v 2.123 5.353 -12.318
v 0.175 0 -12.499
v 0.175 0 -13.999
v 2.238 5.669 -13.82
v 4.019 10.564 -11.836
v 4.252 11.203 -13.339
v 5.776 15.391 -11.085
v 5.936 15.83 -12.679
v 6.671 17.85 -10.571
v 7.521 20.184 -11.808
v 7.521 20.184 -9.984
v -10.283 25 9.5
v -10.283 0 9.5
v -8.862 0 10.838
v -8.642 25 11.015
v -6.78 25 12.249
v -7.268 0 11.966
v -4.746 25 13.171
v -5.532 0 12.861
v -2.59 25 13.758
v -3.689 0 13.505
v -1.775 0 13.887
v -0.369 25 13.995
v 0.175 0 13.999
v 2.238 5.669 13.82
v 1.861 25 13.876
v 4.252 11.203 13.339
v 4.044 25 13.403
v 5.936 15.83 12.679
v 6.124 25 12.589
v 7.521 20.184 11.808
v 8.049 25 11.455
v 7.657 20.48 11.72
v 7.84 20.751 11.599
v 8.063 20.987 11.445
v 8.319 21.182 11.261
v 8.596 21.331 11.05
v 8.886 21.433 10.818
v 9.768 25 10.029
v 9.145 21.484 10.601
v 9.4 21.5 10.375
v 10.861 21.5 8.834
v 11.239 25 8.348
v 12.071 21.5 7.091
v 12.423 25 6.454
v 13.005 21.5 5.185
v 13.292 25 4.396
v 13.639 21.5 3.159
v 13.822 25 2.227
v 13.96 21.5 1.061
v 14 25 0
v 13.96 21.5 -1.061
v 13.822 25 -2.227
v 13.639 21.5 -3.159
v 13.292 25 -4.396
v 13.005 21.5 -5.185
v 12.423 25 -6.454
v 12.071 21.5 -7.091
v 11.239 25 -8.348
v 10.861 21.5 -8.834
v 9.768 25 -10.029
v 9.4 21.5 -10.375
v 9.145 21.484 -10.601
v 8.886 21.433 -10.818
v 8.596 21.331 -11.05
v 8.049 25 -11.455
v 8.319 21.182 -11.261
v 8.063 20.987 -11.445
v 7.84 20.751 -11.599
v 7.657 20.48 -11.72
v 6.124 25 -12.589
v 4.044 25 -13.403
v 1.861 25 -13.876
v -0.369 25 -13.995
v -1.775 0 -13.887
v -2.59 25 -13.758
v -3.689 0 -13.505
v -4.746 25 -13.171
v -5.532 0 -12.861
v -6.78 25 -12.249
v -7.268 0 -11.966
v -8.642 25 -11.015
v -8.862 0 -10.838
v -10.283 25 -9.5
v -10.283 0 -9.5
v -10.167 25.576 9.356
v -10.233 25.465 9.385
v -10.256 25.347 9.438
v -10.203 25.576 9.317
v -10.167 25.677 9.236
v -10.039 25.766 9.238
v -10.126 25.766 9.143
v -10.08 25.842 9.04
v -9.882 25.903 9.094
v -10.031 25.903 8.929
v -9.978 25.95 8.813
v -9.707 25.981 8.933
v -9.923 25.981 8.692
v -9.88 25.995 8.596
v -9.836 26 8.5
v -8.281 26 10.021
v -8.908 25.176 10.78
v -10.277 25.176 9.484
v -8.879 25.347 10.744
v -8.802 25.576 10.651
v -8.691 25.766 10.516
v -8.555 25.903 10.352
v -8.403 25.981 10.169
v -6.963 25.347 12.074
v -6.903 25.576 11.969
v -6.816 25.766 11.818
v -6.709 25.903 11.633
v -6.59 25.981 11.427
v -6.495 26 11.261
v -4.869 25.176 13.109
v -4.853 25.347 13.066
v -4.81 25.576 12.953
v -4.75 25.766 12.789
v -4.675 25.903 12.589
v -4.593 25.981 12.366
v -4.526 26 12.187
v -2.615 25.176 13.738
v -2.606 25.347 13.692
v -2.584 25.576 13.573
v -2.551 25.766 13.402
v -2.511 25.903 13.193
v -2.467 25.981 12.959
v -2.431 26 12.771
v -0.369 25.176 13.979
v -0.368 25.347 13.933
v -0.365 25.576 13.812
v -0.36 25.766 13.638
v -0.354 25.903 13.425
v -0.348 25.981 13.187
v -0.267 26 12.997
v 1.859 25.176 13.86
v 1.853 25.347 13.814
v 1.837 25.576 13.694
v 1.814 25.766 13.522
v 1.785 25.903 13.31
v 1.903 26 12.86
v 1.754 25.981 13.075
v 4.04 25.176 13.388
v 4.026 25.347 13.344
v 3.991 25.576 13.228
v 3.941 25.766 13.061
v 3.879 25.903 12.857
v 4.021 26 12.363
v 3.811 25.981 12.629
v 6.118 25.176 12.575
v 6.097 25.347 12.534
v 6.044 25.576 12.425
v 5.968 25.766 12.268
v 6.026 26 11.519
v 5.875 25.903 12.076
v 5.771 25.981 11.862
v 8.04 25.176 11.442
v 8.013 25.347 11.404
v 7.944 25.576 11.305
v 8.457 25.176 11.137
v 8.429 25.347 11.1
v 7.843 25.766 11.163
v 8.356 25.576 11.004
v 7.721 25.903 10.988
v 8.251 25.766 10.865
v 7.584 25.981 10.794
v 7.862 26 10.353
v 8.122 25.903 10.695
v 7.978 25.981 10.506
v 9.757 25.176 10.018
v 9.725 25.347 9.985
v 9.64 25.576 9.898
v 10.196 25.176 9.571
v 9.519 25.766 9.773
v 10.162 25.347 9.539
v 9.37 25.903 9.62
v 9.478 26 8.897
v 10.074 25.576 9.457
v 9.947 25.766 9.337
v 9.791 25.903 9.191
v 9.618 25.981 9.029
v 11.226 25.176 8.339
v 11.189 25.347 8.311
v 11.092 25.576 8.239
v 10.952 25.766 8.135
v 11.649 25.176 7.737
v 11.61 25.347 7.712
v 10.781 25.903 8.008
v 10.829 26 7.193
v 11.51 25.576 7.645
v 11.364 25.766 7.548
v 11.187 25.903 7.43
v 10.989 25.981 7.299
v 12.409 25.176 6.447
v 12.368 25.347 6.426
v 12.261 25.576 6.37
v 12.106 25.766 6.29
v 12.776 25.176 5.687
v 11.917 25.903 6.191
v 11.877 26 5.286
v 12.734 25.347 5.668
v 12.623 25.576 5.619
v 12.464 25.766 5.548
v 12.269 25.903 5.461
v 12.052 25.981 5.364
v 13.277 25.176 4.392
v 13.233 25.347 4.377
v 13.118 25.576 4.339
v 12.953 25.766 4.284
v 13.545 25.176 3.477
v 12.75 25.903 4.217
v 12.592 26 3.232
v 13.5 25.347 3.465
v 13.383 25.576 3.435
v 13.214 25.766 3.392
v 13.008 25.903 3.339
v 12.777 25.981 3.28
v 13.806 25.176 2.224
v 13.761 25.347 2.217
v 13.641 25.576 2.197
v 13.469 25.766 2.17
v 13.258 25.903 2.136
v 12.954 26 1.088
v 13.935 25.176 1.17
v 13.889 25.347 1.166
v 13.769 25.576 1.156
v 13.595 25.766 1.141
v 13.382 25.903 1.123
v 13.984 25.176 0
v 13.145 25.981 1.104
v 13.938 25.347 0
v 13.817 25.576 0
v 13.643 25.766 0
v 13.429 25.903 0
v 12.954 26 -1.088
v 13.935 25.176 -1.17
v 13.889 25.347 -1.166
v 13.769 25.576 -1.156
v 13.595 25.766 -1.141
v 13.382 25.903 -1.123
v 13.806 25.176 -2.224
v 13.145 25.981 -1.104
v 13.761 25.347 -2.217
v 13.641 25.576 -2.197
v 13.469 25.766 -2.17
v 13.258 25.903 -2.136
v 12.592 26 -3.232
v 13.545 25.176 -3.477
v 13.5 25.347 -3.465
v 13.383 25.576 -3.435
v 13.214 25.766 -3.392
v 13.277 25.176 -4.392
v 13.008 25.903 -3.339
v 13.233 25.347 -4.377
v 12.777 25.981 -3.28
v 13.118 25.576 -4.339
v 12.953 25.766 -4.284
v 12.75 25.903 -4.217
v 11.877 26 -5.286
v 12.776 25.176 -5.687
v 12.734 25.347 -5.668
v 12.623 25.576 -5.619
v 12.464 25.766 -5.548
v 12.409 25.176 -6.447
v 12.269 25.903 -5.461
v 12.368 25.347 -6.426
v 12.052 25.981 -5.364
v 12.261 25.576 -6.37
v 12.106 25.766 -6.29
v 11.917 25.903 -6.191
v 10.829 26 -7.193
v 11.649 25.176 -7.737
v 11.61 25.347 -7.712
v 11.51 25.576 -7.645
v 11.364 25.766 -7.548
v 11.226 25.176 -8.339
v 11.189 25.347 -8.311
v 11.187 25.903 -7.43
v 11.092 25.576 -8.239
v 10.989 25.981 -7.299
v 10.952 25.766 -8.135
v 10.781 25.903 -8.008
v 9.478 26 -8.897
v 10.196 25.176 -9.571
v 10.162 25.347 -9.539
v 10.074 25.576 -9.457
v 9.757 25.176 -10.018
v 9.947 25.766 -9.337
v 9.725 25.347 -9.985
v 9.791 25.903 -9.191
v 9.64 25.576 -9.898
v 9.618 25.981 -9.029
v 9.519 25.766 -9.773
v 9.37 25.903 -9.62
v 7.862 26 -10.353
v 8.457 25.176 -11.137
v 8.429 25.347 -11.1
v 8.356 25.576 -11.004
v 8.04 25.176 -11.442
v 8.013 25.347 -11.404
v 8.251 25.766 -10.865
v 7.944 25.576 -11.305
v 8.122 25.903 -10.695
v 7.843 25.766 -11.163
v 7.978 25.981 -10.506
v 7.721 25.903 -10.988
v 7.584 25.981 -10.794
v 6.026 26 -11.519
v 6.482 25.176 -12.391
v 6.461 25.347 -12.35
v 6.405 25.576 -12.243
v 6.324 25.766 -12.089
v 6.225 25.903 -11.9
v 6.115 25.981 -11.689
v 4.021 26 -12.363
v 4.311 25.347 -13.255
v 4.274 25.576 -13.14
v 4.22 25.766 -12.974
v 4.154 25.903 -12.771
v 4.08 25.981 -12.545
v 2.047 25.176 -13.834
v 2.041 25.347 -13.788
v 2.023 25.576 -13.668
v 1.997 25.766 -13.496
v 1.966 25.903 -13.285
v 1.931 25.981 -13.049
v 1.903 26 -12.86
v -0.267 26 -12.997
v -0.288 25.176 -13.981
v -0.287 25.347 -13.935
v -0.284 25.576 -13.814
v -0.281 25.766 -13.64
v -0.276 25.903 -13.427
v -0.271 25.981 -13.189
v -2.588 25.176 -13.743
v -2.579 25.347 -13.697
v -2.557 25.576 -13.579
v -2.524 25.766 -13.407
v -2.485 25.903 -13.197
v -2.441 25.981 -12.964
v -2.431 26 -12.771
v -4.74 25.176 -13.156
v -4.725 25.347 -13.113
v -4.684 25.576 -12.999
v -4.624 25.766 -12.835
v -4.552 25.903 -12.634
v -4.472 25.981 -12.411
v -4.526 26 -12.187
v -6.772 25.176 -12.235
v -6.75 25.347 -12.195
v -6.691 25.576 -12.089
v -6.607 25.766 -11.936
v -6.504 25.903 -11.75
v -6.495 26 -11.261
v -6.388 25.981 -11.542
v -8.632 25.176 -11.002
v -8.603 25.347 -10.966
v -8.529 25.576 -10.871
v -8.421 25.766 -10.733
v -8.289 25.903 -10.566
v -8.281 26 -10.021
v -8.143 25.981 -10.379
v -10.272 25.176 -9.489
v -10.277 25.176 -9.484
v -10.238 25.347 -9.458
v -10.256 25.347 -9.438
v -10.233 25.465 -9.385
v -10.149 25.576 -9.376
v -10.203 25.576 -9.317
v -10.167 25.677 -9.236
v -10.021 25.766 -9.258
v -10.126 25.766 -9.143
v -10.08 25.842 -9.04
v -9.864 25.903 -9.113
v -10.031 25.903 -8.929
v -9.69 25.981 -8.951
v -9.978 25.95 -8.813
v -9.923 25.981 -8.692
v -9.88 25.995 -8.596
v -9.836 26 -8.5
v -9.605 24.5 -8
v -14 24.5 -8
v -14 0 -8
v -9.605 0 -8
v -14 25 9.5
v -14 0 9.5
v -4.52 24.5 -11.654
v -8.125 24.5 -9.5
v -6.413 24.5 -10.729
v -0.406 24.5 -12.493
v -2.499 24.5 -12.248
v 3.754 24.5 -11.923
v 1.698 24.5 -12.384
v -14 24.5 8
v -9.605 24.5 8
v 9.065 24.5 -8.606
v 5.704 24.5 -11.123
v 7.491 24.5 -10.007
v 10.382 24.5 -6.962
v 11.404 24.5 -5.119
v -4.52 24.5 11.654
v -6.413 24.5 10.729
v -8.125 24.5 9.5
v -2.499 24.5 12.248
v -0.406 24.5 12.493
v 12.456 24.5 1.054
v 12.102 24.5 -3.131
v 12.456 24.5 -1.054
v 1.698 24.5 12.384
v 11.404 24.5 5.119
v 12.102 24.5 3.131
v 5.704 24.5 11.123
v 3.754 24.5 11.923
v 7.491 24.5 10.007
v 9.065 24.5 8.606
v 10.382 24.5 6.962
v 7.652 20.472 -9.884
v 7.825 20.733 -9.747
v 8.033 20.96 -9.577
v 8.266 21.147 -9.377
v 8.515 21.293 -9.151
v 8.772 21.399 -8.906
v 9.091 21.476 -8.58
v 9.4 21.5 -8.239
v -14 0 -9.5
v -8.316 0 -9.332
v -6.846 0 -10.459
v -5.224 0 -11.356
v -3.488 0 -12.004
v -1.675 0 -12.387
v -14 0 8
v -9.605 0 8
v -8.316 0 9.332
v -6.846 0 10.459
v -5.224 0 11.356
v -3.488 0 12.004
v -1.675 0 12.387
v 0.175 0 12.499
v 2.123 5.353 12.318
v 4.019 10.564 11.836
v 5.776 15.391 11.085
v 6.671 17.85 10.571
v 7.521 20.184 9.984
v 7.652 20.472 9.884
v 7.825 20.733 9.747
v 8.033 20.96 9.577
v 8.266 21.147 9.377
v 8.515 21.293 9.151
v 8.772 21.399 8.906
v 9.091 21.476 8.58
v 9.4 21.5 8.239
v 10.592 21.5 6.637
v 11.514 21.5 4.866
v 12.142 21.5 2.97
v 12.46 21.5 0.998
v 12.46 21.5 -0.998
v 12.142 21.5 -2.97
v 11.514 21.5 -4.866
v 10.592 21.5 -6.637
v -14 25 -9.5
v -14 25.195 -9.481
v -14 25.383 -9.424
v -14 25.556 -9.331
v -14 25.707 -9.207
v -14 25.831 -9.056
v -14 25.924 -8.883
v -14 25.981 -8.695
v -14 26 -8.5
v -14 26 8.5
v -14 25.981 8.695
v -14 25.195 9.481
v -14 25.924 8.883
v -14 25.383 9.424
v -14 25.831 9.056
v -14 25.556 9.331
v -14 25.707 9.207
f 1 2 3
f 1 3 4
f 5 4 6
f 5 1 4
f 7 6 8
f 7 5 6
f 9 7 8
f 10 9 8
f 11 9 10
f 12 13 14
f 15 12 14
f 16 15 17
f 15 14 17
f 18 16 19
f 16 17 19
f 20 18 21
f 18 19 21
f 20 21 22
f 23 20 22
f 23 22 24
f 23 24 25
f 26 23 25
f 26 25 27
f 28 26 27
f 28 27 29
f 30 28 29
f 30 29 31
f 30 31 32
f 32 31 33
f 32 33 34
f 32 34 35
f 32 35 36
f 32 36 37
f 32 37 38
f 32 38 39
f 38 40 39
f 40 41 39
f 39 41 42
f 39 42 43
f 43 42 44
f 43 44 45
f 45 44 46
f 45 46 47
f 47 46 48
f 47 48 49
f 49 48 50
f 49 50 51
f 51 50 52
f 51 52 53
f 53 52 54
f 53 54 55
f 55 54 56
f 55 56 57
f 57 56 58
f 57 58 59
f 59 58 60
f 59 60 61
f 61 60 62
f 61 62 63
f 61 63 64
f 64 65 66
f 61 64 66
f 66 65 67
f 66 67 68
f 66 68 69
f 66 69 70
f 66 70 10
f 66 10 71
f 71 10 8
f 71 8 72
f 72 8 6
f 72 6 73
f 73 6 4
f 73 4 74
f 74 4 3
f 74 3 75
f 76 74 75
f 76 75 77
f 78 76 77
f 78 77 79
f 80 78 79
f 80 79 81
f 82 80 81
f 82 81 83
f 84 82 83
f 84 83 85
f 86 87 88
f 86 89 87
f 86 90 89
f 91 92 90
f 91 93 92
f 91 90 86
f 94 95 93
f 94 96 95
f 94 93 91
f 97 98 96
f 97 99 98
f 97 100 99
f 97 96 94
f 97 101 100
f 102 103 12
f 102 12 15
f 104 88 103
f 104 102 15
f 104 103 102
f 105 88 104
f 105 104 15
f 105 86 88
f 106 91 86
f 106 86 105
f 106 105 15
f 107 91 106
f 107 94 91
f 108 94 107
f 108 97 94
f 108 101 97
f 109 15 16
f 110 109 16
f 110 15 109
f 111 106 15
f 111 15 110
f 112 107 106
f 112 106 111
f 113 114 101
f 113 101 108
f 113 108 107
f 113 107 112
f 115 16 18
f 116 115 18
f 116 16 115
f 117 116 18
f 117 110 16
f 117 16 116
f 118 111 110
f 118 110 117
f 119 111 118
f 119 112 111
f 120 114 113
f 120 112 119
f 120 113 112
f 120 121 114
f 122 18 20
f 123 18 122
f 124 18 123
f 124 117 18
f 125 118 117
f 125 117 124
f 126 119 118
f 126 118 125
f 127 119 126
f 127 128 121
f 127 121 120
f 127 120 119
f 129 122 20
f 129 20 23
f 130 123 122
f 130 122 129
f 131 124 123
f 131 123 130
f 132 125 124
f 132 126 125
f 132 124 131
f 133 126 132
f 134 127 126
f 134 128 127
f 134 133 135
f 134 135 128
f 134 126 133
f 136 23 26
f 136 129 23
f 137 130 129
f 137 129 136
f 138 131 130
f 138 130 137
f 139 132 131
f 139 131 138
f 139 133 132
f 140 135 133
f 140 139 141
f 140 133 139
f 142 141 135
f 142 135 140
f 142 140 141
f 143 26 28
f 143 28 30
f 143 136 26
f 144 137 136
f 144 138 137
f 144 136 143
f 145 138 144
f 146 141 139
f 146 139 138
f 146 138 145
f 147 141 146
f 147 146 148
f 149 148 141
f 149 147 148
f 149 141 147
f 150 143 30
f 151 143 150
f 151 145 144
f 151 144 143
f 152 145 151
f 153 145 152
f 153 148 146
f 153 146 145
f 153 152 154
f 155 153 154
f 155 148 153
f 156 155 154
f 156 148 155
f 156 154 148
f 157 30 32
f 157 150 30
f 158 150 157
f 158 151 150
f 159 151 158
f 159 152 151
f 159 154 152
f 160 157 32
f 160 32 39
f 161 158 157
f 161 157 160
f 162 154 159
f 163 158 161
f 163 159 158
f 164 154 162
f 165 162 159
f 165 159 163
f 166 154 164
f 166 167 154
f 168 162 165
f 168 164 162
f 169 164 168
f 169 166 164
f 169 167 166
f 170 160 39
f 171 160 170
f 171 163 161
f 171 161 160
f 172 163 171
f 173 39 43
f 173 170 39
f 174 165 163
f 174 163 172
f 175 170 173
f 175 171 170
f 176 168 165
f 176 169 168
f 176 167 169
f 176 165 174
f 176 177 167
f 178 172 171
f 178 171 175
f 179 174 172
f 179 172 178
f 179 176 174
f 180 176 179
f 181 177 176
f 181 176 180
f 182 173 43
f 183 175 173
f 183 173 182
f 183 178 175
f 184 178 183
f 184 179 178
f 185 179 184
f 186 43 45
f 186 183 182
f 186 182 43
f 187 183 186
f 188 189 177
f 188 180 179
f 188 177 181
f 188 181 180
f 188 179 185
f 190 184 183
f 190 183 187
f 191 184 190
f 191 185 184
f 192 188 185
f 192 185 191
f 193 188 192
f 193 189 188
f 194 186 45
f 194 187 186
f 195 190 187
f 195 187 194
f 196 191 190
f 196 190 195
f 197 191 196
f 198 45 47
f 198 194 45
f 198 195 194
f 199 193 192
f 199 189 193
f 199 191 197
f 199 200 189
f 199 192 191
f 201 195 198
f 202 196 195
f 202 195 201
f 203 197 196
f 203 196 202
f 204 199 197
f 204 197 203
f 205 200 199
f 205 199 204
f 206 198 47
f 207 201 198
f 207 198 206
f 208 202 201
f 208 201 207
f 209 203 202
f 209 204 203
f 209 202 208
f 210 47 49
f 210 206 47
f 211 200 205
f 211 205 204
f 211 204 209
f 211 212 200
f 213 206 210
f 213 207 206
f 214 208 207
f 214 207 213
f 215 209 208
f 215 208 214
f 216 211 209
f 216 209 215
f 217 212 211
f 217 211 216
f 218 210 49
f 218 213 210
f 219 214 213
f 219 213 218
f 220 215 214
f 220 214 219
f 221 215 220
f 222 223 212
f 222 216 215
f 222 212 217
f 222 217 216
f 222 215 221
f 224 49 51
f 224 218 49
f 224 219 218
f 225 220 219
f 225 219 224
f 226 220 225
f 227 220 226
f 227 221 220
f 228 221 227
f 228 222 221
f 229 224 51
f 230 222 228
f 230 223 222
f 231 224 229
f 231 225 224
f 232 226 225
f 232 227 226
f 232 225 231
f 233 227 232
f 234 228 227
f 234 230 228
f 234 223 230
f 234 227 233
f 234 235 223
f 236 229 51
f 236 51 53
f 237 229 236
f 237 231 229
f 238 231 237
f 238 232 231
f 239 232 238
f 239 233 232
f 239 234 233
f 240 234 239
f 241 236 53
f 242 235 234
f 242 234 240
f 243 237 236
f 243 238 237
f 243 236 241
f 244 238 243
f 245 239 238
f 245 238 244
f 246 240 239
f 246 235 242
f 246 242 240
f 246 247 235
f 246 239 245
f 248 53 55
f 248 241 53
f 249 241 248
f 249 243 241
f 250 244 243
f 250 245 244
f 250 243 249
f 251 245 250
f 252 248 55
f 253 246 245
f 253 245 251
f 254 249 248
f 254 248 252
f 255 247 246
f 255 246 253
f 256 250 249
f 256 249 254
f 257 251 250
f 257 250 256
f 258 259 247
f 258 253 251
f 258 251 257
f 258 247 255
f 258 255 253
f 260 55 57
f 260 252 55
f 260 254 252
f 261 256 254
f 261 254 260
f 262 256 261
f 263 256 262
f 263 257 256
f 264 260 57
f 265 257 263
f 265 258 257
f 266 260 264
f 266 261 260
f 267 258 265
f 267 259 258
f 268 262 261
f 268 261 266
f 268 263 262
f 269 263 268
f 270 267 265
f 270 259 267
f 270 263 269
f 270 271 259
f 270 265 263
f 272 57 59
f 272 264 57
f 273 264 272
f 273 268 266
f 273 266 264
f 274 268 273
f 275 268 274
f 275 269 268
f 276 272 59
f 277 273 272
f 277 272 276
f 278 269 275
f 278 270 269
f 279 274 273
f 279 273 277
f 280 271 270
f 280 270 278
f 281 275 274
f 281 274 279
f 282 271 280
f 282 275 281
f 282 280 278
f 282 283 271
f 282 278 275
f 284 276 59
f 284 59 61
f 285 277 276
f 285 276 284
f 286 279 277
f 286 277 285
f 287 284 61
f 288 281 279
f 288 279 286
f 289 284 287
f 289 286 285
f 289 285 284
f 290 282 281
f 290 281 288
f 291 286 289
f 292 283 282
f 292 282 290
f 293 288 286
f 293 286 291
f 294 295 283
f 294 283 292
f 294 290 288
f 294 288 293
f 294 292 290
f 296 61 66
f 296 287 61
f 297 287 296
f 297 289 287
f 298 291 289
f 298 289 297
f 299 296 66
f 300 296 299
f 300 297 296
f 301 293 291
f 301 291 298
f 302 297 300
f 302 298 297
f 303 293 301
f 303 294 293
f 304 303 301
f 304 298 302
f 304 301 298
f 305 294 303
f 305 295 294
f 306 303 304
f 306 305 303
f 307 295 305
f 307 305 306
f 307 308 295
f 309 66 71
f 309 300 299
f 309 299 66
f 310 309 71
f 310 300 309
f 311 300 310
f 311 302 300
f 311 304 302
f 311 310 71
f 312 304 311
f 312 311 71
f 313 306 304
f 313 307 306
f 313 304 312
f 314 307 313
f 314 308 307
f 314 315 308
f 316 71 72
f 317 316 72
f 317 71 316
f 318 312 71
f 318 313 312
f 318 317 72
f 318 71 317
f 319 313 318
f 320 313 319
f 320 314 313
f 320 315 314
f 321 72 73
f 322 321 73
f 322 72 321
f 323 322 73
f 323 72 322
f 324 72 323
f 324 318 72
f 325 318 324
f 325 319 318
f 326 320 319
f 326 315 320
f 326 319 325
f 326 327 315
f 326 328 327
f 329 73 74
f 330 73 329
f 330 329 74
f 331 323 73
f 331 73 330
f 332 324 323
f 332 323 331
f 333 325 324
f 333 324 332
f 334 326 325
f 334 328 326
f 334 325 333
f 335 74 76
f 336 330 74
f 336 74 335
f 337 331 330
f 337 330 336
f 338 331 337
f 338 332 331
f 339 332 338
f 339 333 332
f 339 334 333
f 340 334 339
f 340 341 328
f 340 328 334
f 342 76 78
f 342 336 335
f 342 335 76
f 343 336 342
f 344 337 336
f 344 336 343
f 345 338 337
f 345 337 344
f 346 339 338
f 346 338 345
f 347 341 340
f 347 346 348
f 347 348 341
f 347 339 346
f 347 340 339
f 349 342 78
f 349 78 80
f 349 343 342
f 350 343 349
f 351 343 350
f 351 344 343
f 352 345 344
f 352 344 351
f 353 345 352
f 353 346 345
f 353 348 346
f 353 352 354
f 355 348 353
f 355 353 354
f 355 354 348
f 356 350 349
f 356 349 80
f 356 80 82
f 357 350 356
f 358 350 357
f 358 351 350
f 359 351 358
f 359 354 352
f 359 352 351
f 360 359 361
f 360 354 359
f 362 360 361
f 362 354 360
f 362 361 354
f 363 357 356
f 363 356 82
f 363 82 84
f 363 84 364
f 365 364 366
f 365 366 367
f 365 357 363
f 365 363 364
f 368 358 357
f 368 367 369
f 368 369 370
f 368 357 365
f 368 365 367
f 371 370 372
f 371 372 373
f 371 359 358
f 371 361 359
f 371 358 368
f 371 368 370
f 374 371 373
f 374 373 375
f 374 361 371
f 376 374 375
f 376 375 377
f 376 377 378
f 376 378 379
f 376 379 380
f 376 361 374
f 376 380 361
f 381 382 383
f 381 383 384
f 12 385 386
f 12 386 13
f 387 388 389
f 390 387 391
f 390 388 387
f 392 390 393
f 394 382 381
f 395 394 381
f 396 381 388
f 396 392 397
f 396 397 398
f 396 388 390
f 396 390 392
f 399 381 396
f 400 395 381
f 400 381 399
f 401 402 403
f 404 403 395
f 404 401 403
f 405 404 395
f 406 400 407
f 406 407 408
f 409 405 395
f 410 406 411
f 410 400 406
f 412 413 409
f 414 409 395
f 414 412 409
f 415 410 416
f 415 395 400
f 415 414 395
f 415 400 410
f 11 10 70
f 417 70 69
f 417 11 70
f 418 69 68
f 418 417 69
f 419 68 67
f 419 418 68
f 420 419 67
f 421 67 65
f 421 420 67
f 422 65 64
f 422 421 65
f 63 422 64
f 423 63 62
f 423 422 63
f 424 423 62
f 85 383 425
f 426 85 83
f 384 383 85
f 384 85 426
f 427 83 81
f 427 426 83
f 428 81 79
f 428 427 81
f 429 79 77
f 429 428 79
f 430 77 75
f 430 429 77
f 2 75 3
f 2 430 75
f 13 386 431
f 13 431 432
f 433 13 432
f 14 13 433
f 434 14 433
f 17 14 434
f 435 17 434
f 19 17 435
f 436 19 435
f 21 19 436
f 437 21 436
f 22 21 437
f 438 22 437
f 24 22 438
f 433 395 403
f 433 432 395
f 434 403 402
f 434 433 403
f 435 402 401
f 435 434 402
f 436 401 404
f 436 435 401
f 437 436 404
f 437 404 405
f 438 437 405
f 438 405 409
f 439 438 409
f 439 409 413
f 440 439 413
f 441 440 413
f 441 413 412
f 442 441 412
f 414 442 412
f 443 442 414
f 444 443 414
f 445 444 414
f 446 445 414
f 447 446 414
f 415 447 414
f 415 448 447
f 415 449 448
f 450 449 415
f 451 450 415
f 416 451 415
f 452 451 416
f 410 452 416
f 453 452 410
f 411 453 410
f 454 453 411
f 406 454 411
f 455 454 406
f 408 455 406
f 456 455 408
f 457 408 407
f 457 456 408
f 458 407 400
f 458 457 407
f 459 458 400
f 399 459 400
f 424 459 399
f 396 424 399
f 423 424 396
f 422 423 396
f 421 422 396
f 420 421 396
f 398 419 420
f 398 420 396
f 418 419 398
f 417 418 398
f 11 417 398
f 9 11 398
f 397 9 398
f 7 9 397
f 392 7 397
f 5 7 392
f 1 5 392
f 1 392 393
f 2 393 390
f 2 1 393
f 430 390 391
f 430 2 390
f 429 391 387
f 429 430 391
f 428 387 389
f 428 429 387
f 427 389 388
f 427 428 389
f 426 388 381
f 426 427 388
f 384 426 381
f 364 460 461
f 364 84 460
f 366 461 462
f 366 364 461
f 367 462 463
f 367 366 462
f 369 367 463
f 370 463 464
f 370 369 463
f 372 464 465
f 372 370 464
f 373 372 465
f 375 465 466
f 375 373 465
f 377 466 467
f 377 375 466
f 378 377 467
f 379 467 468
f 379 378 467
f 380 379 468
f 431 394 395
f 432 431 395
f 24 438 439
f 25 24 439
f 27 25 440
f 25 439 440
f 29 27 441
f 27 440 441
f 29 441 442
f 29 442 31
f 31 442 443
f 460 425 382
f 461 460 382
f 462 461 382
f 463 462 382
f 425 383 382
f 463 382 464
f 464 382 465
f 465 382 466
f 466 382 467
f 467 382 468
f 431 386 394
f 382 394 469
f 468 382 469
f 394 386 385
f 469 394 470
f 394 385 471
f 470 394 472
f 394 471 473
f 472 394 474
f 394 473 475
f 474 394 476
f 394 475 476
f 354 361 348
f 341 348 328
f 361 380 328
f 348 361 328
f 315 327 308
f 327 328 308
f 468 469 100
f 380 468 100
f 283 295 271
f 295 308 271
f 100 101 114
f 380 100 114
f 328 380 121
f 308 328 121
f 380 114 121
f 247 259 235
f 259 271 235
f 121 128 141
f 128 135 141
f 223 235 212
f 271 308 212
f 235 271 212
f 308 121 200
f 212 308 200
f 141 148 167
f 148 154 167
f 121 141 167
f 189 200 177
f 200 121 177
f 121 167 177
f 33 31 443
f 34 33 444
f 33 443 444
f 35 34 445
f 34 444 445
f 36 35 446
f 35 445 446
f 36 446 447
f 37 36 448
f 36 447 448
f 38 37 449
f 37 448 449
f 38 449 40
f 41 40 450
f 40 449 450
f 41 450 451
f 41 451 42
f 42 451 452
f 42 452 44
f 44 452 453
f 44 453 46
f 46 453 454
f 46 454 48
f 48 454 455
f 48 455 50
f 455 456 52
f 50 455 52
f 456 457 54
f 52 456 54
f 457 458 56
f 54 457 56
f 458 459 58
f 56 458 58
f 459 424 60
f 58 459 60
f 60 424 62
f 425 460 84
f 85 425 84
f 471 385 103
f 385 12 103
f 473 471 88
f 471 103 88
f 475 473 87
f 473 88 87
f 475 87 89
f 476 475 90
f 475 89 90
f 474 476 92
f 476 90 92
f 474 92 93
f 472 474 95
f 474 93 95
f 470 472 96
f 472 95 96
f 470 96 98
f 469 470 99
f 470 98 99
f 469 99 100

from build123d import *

# Parameters (mm, degrees)
SKETCH1_R               = 14
BOSS_EXTRUDE1_DEPTH     = 26
SKETCH3_W               = 14
SKETCH3_H               = 26
BOSS_EXTRUDE2_DEPTH     = 9.5
SHELL1_T                = -1.5
CUT_EXTRUDE1_DEPTH      = 15
CUT_EXTRUDE1_DEPTH_BACK = 15
FILLET1_R               = 1


with BuildPart() as part:
    # Sketch1 → Boss-Extrude1 (new body)
    with BuildSketch(Plane(origin=(0, 0, 0), x_dir=(1, 0, 0), z_dir=(0, 1, 0))):
        Circle(SKETCH1_R)
    extrude(amount=BOSS_EXTRUDE1_DEPTH)

    # Sketch3 → Boss-Extrude2 (add, symmetric)
    with BuildSketch(Plane.XY):
        with Locations((-7, 13)):
            Rectangle(SKETCH3_W, SKETCH3_H)
    extrude(amount=BOSS_EXTRUDE2_DEPTH, both=True)

    # Shell1
    shell1_openings = [part.faces().sort_by_distance(p)[0] for p in [
        (-6.070870475, 0, 0),
        (-14, 13, 0),
    ]]
    offset(amount=SHELL1_T, openings=shell1_openings, kind=Kind.INTERSECTION)

    # Sketch4 → Cut-Extrude1 (cut, two sides)
    with BuildSketch(Plane.XY) as cut_extrude1_sk:
        with BuildLine():
            Line((0.174639963, 0), (7.521029835, 20.184040287))
            ThreePointArc((7.521029835, 20.184040287), (8.253262204, 21.138304089), (9.400415076, 21.5))
            Line((9.400415076, 21.5), (14, 21.5))
            Line((14, 21.5), (14, 0))
            Line((14, 0), (0.174639963, 0))
        make_face()
    extrude(amount=CUT_EXTRUDE1_DEPTH, mode=Mode.SUBTRACT)
    extrude(cut_extrude1_sk.sketch, amount=-CUT_EXTRUDE1_DEPTH_BACK, mode=Mode.SUBTRACT)

    # Fillet1
    fillet1_edges = [part.edges().sort_by_distance(p)[0] for p in [
        (-12.14174095, 26, 9.5),
        (-12.14174095, 26, -9.5),
        (14, 26, 0),
    ]]
    fillet(fillet1_edges, radius=FILLET1_R)


solid = part.part
